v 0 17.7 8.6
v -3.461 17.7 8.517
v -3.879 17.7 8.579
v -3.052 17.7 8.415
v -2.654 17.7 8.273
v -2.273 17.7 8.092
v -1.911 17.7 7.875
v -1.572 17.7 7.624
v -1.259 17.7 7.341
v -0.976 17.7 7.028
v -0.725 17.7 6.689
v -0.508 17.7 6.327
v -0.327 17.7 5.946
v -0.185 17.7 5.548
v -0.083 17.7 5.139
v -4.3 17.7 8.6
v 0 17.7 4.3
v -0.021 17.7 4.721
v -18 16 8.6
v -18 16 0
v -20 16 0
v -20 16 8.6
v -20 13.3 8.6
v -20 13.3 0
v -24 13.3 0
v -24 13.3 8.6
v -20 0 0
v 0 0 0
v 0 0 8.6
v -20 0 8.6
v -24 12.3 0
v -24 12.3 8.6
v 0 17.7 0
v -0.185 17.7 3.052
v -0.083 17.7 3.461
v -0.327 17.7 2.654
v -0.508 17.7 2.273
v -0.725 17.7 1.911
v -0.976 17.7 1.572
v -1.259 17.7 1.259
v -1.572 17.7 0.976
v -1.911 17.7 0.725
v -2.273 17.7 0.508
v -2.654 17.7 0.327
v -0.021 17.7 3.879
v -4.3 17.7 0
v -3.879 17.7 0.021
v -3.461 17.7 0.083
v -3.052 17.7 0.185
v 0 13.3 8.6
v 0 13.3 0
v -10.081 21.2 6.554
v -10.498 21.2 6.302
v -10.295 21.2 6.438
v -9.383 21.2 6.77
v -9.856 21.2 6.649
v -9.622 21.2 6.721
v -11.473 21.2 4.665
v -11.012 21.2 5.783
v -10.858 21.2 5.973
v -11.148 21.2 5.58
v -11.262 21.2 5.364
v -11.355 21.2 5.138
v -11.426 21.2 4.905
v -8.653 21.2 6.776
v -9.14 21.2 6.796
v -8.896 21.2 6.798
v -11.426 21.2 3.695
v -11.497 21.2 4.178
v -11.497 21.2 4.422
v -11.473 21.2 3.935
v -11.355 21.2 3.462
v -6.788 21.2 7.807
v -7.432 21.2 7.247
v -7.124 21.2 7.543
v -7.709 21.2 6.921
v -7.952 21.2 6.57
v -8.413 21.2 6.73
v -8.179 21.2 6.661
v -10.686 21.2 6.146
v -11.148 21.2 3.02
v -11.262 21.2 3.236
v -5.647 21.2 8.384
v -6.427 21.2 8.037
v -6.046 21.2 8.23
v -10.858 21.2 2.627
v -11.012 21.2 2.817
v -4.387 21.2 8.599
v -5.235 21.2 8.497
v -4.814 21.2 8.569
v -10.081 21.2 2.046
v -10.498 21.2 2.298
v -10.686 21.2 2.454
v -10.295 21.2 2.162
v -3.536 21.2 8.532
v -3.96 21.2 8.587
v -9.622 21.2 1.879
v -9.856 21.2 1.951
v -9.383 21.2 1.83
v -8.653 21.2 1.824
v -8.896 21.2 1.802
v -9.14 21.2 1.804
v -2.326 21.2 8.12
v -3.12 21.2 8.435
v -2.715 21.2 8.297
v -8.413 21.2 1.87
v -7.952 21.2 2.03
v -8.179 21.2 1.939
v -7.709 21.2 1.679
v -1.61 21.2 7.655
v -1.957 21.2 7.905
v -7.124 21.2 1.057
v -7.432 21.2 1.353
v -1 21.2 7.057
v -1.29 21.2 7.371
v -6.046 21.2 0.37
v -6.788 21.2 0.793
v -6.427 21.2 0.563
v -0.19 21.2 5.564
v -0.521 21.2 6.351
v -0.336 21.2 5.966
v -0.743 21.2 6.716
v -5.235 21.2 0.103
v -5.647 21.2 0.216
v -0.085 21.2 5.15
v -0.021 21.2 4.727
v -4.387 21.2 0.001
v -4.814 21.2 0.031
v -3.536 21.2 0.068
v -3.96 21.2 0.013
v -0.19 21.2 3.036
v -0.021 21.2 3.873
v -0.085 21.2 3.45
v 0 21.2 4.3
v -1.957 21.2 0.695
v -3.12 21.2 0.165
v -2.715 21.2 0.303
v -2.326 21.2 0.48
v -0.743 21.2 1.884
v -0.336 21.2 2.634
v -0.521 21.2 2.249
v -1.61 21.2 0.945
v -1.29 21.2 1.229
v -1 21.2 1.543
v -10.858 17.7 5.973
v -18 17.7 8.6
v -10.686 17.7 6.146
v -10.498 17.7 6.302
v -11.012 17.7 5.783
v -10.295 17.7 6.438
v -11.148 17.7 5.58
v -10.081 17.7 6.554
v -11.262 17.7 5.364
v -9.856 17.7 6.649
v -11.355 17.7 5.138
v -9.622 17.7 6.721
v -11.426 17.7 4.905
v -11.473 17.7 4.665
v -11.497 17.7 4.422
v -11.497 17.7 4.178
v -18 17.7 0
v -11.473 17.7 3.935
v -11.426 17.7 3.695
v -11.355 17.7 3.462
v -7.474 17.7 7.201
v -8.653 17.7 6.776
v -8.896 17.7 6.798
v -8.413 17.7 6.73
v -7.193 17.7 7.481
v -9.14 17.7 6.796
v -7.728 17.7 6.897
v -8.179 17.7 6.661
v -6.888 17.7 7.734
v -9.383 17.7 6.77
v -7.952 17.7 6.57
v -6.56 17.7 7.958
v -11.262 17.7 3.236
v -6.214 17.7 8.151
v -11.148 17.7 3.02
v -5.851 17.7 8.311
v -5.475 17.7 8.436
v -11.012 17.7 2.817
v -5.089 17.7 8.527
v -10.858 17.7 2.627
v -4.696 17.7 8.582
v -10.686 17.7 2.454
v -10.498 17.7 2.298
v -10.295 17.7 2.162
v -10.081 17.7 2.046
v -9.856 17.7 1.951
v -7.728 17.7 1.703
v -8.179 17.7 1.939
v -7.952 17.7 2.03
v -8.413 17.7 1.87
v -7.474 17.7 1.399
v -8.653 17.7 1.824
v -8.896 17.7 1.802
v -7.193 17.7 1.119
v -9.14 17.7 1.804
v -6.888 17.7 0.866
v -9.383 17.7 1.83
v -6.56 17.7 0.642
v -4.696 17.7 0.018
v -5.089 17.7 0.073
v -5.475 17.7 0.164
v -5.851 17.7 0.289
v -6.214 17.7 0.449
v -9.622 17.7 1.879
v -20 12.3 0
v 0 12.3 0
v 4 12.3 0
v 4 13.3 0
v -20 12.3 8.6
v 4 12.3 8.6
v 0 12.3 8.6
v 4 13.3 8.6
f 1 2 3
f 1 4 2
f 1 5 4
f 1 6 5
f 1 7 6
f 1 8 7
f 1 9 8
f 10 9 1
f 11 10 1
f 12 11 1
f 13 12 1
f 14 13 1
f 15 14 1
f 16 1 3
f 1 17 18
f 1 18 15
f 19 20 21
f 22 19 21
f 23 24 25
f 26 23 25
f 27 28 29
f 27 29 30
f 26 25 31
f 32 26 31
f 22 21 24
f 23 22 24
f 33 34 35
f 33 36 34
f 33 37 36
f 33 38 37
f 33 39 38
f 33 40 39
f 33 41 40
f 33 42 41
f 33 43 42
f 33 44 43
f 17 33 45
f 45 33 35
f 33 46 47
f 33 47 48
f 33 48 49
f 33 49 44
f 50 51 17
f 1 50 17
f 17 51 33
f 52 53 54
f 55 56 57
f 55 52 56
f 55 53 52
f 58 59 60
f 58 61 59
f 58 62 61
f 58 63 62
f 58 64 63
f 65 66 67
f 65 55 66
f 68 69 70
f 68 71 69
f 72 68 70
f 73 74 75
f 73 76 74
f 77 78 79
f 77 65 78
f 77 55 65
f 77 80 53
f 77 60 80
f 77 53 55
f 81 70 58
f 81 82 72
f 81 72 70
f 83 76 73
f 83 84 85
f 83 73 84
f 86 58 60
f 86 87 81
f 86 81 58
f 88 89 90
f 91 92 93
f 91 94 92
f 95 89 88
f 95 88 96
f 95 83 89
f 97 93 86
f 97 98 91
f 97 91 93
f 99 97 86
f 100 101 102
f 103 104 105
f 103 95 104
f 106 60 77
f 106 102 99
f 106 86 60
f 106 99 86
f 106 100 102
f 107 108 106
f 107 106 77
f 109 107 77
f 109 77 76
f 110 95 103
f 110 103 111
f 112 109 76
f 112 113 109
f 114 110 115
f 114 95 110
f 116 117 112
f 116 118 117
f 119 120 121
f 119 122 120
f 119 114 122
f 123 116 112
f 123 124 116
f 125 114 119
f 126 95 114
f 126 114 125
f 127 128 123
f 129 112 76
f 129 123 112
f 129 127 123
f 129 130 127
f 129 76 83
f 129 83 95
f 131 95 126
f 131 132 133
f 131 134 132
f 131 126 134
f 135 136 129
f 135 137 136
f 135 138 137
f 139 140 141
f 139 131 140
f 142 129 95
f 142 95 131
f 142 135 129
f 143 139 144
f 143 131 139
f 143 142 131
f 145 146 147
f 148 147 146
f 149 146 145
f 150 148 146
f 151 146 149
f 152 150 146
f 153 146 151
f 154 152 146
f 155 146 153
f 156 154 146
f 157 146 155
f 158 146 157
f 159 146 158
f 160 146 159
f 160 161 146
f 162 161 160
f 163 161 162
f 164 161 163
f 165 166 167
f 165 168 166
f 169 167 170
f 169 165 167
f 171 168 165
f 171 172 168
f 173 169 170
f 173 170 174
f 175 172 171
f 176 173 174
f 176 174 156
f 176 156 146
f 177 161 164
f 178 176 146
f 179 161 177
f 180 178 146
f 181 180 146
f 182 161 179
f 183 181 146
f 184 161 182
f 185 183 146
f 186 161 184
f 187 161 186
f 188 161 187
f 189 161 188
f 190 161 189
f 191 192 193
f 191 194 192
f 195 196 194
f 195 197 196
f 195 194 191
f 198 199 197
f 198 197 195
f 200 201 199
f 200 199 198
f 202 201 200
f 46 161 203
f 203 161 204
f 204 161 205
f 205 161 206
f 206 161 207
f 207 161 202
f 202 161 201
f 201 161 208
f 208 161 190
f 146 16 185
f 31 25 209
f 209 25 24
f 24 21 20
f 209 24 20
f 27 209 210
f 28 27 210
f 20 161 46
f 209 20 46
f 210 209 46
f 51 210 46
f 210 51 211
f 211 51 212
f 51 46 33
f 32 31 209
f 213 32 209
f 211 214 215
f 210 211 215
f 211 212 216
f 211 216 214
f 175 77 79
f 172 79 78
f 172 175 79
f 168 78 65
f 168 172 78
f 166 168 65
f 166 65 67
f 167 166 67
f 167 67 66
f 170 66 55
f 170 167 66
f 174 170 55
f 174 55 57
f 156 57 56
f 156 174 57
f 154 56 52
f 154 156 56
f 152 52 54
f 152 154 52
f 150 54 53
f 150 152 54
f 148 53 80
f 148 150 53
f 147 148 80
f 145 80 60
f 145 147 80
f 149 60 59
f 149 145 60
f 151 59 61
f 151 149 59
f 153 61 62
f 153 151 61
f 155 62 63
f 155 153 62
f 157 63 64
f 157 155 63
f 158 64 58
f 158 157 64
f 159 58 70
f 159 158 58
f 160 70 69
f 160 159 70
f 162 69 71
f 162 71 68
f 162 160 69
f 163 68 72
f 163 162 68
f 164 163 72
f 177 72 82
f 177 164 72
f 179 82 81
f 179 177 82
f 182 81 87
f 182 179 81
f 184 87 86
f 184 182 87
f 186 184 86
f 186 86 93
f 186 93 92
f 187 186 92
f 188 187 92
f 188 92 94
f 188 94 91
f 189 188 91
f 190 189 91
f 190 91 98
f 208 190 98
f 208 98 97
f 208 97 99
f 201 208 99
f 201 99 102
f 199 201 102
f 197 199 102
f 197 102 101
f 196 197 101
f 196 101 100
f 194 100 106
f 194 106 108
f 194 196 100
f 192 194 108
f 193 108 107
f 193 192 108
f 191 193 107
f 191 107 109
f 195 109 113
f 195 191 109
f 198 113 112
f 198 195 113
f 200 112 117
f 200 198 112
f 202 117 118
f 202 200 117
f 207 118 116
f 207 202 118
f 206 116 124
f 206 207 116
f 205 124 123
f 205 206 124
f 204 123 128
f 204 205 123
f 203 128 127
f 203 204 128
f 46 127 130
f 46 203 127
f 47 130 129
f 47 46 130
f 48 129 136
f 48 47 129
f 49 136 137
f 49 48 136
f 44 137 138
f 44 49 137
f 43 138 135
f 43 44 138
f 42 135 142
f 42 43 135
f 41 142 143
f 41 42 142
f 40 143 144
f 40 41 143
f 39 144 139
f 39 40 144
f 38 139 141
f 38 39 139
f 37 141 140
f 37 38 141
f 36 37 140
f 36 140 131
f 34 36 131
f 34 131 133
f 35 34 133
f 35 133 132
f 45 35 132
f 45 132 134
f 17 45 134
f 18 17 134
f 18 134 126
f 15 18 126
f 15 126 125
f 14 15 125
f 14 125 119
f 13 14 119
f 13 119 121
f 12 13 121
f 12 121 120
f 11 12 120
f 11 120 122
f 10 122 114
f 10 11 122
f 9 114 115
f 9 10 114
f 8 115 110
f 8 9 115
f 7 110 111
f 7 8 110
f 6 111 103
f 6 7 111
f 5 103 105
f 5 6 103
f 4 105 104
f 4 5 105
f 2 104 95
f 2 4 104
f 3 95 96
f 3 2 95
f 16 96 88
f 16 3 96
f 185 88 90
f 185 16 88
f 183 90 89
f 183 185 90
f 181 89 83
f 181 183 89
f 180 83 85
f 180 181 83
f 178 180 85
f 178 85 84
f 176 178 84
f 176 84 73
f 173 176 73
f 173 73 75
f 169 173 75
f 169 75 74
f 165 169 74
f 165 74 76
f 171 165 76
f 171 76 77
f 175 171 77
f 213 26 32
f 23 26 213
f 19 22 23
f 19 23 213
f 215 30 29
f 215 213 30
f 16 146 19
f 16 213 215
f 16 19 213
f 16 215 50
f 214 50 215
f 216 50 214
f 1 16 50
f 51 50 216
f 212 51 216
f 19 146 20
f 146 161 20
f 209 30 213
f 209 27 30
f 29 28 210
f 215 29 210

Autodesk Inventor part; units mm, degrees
ref_plane "YZ Plane" through (0, 0, 0) normal (1, 0, 0) x (0, 1, 0)
ref_plane "XZ Plane" through (0, 0, 0) normal (0, 1, 0) x (-1, 0, 0)
ref_plane "XY Plane" through (0, 0, 0) normal (0, 0, 1) x (1, 0, 0)
sketch "Sketch1" plane through (0, 0, 0) normal (0, 0, 1) x (1, 0, 0)
  line L0 (0, 0) -> (-20, 0)
  line L1 (-18, 17.7) -> (0, 17.7)
  line L2 (-20, 17.7) -> (-18, 17.7)
  line L3 (-18, 17.7) -> (-18, 16)
  line L4 (-18, 16) -> (-20, 16)
  line L5 (-20, 16) -> (-20, 13.3)
  line L6 (-20, 13.3) -> (-24, 13.3)
  line L7 (-24, 13.3) -> (-24, 12.3)
  line L8 (-24, 12.3) -> (-20, 12.3)
  line L9 (-20, 0) -> (-20, 12.3)
  line L10 (-20, 13.3) -> (-20, 16)
  line L11 (0, 13.3) -> (4, 13.3)
  line L12 (4, 13.3) -> (4, 12.3)
  line L13 (4, 12.3) -> (0, 12.3)
  line L14 (0, 0) -> (0, 12.3)
  line L15 (0, 13.3) -> (0, 17.7)
  dimension "d0" = 20
  dimension "d1" = 17.7
  dimension "d2" = 2
  dimension "d3" = 1.7
  dimension "d4" = 2.7
  dimension "d5" = 4
  dimension "d6" = 1
extrude "Extrusion1" add sketch "Sketch1" along normal blind 8.6
sketch "Sketch2" plane through (-18, 17.7, 0) normal (0, 1, 0) x (1, 0, 0)
  line L0 (18, 0) -> (0, 0) projected
  line L1 (0, 0) -> (0, -8.6) projected
  line L2 (18, -8.6) -> (0, -8.6) projected
  line L3 (18, 0) -> (18, -8.6) projected
  circle A0 centre (13.7, -4.3) radius 4.3
extrude "Extrusion2" add sketch "Sketch2" along normal blind 3.5 contours A0
sketch "Sketch3" plane through (-18, 17.7, 8.6) normal (0, 1, 0) x (1, 0, 0)
  line L0 (18, 8.6) -> (18, 4.3) projected
  line L1 (9, 8.6) -> (9, 0)
  line L2 (13.7, 8.6) -> (0, 8.6) projected
  line L3 (13.7, 0) -> (0, 0) projected
  line L4 (6.1752, 8.6) -> (10.4672, 8.6)
  line L5 (6.1752, 0) -> (10.4672, 0)
  circle A0 centre (9, 4.3) radius 2.5
  dimension "d11" = 9
  dimension "d12" = 5
extrude "Extrusion3" add sketch "Sketch3" along normal up to surface (3.5 mm away)
sketch "Sketch4" plane through (0, 0, 8.6) normal (0, 0, 1) x (1, 0, 0)
  line L0 (-24, 13.3) -> (-24, 12.3) projected
  line L1 (-20, 13.3) -> (-24, 13.3) projected
  line L2 (-20, 16) -> (-20, 13.3) projected
  line L3 (-18, 16) -> (-20, 16) projected
  line L4 (-18, 17.7) -> (-18, 16) projected
  line L5 (-4.3, 17.7) -> (-18, 17.7) projected
  line L6 (0, 17.7) -> (-4.3, 17.7) projected
  line L7 (0, 13.3) -> (0, 17.7) projected
  line L8 (4, 13.3) -> (0, 13.3) projected
  line L9 (4, 12.3) -> (4, 13.3) projected
  line L10 (0, 12.3) -> (4, 12.3) projected
  line L11 (0, 0) -> (0, 12.3) projected
  line L12 (-20, 0) -> (0, 0) projected
  line L13 (-20, 12.3) -> (-20, 0) projected
  line L14 (-24, 12.3) -> (-20, 12.3) projected
sketch "Sketch5" plane through (0, 0, 0) normal (1, 0, 0) x (0, 0, -1)
  line L0 (0, 0) -> (0, 12.3) projected
  line L1 (0, 12.3) -> (-8.6, 12.3) projected
  line L2 (-8.6, 0) -> (-8.6, 12.3) projected
  line L3 (0, 0) -> (-8.6, 0) projected
properties part number "Servo"
